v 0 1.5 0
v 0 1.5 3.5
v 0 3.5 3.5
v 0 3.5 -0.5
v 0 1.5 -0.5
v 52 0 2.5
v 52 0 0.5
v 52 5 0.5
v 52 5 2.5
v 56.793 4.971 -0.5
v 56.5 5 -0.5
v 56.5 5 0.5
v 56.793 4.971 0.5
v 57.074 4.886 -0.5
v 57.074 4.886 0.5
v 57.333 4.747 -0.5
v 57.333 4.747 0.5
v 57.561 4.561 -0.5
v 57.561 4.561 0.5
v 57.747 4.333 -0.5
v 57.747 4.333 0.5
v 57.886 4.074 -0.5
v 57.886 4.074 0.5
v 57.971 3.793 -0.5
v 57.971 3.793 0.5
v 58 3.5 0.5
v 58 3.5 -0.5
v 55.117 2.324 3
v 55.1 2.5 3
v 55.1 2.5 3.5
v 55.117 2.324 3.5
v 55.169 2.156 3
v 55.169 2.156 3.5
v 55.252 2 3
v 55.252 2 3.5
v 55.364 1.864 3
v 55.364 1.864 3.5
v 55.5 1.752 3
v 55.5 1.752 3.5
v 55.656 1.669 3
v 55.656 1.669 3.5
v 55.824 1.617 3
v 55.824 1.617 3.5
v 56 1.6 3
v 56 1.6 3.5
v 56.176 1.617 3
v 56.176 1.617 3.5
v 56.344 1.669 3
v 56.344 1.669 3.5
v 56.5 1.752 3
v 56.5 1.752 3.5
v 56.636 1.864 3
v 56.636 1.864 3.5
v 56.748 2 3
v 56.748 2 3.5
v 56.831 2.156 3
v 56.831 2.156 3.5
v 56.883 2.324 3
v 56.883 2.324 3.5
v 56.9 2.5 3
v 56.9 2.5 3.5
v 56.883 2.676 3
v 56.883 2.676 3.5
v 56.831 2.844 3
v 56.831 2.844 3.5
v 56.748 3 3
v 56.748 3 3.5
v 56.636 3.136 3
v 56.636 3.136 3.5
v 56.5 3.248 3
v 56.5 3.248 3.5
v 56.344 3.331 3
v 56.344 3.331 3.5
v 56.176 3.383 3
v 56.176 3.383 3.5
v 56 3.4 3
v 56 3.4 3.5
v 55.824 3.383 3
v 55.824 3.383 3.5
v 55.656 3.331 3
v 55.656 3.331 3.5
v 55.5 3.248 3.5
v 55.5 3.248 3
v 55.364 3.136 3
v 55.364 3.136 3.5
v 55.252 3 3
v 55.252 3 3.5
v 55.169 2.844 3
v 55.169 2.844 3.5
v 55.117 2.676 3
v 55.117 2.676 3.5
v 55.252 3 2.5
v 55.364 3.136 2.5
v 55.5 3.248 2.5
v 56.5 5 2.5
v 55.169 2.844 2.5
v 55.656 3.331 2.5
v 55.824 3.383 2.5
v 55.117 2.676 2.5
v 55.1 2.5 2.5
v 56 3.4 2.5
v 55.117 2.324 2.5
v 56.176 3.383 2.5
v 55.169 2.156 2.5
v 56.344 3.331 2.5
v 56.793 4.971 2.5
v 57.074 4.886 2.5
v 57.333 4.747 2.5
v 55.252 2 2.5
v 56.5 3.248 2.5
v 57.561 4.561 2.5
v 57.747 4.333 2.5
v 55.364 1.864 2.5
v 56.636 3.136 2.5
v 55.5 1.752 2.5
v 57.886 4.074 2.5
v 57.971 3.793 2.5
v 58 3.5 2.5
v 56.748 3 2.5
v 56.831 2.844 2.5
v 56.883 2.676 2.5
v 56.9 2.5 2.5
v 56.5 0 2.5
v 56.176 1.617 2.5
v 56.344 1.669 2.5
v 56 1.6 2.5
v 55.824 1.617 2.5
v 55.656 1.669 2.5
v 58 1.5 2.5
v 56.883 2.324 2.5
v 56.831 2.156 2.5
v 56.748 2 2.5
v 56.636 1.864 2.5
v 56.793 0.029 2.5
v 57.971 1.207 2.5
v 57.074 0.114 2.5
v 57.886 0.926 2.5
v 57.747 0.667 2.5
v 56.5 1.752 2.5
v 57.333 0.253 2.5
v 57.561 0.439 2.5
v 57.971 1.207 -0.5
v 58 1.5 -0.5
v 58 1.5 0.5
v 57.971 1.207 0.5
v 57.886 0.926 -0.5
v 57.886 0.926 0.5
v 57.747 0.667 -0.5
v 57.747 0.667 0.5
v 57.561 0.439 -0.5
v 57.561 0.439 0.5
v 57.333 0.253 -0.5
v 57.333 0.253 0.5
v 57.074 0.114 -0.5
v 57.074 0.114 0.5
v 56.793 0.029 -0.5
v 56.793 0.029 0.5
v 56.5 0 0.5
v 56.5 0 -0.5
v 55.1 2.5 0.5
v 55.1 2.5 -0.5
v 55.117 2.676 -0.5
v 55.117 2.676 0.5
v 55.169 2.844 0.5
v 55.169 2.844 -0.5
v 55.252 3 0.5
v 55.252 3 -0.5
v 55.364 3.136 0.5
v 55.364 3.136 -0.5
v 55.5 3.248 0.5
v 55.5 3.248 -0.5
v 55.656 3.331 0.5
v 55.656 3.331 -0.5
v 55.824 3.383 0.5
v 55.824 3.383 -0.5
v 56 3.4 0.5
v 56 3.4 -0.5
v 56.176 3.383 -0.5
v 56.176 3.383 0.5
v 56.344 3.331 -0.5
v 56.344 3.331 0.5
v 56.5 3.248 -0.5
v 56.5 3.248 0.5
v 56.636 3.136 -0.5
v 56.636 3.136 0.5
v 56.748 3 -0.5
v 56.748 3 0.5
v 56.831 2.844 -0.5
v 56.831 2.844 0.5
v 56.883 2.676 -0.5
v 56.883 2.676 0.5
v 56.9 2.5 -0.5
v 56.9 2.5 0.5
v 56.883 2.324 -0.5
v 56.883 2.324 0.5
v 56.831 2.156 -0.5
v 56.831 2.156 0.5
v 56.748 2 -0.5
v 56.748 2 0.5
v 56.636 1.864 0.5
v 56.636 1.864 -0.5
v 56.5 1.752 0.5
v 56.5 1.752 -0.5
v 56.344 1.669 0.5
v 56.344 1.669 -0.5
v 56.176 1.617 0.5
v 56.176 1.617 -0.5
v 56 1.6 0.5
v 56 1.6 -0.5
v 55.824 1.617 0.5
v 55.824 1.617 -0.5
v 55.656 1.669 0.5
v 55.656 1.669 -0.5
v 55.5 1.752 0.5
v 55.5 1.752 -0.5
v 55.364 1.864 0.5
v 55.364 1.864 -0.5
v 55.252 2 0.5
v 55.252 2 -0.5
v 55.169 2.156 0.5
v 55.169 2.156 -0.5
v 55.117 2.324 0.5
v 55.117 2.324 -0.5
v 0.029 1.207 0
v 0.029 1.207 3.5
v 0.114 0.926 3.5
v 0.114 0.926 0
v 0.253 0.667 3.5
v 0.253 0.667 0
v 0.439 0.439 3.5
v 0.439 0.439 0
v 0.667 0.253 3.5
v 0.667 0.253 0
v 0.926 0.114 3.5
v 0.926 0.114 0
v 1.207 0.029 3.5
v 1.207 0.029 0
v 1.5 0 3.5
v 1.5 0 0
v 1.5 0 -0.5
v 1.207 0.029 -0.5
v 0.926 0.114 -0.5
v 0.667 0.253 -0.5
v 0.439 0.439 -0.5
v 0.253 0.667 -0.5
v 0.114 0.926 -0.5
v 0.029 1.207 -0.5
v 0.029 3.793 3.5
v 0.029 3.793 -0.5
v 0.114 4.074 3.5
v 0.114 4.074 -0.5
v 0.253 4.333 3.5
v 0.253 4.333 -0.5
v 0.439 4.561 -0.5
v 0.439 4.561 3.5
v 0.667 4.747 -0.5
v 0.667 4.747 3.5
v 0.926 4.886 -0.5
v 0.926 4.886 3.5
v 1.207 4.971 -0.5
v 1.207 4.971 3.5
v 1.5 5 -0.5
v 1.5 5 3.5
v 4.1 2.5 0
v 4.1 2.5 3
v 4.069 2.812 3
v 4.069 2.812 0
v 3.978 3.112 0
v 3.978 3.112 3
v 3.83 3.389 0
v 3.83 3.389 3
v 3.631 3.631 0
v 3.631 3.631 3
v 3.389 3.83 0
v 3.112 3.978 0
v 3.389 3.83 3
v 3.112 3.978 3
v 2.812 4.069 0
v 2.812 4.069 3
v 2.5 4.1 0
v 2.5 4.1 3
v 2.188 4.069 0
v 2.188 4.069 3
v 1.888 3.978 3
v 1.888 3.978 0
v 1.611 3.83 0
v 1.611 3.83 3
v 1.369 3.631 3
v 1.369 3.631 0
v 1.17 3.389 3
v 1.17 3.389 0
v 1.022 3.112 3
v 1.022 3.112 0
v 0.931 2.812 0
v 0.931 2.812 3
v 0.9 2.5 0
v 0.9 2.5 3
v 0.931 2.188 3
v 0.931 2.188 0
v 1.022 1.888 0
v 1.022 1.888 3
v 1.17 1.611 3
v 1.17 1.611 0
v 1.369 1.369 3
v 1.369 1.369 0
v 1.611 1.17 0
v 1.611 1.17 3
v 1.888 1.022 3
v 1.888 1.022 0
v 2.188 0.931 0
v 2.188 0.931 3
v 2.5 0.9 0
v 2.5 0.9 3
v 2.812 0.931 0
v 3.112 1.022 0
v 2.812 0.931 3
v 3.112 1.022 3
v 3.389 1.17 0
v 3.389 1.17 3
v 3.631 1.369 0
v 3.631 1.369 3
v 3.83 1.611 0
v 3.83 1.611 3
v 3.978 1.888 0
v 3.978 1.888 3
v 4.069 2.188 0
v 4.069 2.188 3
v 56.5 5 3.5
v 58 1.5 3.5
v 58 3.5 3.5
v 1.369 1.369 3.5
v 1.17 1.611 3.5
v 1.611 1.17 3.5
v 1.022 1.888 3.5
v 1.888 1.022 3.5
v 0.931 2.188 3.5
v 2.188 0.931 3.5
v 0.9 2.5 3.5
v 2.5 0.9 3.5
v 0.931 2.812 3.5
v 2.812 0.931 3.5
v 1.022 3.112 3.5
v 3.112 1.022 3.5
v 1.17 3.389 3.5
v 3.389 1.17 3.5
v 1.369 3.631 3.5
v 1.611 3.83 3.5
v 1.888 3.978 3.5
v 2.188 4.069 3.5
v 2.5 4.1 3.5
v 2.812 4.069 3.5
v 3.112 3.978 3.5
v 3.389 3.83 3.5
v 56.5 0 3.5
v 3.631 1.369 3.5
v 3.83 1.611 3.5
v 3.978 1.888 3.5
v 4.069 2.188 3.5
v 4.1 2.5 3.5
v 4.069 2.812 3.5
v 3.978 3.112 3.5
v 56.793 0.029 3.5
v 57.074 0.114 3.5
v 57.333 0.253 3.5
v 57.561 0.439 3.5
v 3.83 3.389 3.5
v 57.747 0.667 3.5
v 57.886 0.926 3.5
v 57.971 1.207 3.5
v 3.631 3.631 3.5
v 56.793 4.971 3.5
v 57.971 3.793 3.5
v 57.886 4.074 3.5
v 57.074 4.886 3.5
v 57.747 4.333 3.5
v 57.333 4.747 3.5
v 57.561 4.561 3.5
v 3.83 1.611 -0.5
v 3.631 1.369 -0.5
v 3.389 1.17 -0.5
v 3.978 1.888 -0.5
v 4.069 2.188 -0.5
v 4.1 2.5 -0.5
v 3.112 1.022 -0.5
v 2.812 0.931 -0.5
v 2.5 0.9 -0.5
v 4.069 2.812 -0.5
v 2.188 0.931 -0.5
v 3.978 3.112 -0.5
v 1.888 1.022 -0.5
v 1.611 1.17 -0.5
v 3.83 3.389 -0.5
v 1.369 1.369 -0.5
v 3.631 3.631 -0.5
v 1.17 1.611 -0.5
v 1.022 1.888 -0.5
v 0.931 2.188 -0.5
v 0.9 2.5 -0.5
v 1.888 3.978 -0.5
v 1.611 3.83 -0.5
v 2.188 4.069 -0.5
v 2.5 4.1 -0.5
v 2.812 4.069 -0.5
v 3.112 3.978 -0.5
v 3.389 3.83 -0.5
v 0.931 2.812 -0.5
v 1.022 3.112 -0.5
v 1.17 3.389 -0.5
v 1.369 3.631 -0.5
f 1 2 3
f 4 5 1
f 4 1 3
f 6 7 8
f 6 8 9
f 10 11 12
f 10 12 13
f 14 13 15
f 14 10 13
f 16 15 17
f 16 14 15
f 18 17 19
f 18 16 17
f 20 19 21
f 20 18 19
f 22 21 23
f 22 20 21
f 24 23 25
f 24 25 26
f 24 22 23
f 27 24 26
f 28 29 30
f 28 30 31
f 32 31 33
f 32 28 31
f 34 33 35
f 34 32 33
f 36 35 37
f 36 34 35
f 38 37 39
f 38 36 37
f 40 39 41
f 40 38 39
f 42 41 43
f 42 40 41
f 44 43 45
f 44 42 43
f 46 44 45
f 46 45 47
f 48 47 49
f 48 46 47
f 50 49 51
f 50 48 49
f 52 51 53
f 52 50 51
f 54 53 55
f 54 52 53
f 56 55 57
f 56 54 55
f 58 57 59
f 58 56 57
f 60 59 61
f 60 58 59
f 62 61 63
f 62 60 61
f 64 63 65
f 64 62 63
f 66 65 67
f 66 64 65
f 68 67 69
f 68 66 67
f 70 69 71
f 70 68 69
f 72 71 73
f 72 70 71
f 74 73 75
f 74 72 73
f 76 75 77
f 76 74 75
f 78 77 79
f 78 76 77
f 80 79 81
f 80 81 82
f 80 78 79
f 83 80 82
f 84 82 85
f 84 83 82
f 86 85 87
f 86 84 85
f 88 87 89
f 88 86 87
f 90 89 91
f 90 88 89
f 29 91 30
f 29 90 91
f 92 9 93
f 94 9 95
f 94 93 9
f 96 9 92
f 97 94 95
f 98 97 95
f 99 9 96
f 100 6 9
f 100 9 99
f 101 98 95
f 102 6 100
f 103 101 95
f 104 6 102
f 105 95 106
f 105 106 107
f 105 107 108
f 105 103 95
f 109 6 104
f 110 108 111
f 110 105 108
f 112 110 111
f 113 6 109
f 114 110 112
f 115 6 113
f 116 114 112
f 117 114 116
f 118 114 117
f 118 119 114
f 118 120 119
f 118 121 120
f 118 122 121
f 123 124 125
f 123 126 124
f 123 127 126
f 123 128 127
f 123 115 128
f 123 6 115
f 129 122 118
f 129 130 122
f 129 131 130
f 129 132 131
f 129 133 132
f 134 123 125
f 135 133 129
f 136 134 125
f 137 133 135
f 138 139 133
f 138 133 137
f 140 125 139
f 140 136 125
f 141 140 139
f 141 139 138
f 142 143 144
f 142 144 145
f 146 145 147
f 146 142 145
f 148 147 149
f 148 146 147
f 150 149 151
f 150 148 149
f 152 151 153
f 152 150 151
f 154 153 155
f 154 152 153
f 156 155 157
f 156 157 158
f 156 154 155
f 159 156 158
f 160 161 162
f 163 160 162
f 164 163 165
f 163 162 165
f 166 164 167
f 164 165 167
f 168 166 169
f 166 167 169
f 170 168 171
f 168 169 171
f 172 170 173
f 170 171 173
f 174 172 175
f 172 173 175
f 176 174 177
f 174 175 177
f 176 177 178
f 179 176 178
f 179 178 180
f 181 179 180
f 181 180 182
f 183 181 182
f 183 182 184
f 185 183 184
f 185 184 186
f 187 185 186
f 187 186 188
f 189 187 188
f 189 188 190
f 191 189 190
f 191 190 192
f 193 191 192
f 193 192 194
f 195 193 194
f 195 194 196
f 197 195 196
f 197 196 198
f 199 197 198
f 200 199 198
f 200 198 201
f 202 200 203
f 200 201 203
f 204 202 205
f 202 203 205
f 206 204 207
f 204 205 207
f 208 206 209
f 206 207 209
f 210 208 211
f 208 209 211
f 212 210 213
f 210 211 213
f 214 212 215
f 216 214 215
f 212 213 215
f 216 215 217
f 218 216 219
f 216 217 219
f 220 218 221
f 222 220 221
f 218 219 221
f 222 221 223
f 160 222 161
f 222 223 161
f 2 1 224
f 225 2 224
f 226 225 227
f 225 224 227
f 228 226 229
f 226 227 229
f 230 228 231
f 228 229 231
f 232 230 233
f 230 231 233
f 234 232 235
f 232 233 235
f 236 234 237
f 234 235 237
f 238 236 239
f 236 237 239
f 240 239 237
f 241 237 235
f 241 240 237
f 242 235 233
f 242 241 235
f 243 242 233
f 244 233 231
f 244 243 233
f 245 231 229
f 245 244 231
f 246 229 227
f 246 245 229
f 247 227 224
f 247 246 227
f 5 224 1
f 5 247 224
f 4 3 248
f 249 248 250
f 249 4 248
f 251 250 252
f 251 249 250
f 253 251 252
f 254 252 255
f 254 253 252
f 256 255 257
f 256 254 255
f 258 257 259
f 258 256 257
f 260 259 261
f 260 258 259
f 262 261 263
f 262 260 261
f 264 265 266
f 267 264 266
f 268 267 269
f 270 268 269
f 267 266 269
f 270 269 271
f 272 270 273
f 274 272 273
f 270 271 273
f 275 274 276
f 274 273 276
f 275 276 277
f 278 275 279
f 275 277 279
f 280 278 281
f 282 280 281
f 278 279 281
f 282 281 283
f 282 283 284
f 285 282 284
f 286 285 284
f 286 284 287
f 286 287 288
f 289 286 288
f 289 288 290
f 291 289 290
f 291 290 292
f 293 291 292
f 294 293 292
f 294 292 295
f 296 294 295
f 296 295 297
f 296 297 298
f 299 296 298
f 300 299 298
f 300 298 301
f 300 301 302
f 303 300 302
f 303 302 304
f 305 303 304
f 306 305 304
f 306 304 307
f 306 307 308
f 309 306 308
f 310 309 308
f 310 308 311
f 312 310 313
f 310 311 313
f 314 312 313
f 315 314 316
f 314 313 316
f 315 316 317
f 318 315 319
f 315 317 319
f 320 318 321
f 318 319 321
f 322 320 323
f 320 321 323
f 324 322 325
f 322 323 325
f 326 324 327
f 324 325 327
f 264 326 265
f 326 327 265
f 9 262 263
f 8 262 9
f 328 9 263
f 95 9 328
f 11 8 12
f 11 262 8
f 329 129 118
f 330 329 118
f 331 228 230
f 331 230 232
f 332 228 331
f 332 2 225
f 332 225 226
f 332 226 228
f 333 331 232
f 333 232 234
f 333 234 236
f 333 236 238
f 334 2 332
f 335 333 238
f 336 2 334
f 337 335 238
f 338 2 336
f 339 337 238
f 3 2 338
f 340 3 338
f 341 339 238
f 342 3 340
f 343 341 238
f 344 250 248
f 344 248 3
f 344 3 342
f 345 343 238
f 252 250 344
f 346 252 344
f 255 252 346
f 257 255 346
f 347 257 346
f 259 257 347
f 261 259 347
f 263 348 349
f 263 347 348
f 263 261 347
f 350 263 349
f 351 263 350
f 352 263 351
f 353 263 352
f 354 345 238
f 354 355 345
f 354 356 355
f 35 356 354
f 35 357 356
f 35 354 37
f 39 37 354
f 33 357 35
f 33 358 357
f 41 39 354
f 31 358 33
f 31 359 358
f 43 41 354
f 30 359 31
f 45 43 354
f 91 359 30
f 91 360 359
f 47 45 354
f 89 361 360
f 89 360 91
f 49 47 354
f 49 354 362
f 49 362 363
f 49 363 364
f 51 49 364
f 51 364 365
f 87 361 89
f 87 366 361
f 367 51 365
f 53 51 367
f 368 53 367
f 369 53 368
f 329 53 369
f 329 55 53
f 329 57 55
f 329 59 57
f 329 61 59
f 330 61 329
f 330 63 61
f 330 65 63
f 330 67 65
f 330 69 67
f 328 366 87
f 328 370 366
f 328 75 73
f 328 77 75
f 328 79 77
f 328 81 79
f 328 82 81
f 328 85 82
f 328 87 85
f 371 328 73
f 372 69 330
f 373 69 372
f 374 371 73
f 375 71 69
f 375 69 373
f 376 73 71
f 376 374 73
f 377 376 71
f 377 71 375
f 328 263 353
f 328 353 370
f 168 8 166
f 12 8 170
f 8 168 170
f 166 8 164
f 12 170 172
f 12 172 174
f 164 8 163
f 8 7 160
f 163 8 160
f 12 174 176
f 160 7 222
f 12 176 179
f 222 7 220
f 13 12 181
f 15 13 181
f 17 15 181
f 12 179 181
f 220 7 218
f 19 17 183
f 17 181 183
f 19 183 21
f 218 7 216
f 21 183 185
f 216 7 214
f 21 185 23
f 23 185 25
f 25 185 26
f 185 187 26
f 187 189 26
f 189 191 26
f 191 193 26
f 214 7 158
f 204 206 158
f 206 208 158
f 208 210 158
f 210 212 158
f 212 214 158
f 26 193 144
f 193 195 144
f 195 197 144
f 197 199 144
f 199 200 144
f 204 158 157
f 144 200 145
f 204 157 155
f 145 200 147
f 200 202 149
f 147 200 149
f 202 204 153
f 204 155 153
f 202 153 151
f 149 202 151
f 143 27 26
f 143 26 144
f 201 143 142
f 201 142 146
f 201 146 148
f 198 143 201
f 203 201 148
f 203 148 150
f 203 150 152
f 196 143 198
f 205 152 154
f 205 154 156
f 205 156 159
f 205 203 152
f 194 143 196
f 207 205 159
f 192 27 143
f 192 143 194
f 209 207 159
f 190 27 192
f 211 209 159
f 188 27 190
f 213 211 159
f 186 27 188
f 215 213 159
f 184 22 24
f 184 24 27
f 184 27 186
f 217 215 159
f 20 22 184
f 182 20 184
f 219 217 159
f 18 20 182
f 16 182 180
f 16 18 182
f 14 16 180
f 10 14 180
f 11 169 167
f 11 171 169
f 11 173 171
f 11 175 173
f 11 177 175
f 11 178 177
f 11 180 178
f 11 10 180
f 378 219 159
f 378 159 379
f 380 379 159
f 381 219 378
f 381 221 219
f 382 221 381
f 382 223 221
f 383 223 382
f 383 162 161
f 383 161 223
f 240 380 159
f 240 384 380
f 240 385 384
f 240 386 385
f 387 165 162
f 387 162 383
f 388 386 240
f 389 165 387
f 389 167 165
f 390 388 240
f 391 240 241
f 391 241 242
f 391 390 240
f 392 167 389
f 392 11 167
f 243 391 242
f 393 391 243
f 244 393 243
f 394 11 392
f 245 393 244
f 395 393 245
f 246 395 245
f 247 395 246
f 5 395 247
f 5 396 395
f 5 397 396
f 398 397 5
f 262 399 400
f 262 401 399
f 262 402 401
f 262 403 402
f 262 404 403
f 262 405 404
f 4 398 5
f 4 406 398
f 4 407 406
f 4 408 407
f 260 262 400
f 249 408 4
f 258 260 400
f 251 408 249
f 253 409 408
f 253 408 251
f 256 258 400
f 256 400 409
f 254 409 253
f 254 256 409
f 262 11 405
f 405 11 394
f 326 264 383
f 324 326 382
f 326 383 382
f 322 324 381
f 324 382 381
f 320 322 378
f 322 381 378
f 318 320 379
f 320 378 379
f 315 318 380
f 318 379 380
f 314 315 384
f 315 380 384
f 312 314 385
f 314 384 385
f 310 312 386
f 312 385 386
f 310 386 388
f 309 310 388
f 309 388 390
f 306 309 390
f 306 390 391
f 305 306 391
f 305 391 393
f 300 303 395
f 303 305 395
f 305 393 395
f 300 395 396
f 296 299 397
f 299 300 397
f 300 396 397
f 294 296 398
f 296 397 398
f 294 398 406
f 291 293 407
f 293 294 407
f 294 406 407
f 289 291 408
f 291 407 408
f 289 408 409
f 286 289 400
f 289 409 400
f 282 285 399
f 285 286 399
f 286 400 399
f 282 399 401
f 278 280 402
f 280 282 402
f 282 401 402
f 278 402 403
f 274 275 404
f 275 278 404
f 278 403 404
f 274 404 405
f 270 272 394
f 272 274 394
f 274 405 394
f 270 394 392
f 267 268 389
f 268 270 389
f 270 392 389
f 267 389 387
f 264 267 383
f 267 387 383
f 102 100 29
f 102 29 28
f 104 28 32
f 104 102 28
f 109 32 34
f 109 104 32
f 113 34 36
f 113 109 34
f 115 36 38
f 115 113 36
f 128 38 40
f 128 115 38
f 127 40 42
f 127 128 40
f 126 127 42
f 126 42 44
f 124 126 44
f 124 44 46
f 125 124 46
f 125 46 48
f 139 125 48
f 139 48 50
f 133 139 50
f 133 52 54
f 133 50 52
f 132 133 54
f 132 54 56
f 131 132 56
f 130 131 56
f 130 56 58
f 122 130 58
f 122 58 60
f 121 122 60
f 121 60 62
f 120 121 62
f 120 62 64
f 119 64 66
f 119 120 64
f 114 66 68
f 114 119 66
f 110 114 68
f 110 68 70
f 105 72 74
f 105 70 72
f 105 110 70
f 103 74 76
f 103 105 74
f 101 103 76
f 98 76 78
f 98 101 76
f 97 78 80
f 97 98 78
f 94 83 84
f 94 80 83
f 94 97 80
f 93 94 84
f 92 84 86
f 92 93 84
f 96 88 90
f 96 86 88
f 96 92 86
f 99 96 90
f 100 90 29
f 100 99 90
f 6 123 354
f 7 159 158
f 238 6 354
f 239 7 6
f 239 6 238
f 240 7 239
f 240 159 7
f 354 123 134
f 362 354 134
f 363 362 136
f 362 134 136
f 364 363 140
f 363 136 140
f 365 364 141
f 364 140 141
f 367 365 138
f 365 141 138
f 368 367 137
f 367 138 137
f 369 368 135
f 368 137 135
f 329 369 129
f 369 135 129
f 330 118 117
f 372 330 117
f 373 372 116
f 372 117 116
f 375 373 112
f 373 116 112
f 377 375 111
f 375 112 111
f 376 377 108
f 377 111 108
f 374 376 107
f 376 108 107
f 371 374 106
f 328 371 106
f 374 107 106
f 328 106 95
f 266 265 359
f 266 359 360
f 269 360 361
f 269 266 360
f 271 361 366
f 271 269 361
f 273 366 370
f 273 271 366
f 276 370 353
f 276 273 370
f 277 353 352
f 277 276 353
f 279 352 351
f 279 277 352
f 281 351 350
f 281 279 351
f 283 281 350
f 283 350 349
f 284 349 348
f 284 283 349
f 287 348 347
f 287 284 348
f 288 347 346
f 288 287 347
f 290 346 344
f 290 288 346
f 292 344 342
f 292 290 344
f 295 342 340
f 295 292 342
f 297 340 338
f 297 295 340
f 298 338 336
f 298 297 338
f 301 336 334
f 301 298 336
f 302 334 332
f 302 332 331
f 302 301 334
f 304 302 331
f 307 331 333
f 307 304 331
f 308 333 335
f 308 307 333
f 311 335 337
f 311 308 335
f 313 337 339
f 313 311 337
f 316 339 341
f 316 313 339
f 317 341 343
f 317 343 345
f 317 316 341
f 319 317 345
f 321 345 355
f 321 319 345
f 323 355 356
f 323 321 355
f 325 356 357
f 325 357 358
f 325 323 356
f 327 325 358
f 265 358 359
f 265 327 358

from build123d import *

# Parameters (mm, degrees)
SKETCH_5_W          = 58
SKETCH_5_H          = 3
EXTRUDE_1_DEPTH     = 5
CUT_EXTRUDE_1_REACH = 60.292
SKETCH_6_R          = 1.6
CUT_EXTRUDE_2_REACH = 60.292
SKETCH_7_R          = 0.9
FILLET_1_R          = 1.5
SKETCH_8_W          = 6
SKETCH_8_H          = 1.6
CUT_EXTRUDE_3_DEPTH = 10
SKETCH_10_R         = 1.6
SKETCH_10_R_2       = 0.9
EXTRUDE_2_DEPTH     = 0.5
EXTRUDE_START       = 0.5
SKETCH_11_R         = 0.9
SKETCH_11_R_2       = 1.6
EXTRUDE_3_DEPTH     = 0.5
SKETCH_12_W         = 6.44666191
SKETCH_12_H         = 2
CUT_EXTRUDE_4_DEPTH = 10


with BuildPart() as part:
    # 草图5 → 凸台-拉伸1 (new body)
    with BuildSketch(Plane(origin=(0, 0, 0), x_dir=(1, 0, 0), z_dir=(0, 1, 0))):
        with Locations((29, -1.5)):
            Rectangle(SKETCH_5_W, SKETCH_5_H)
    extrude(amount=EXTRUDE_1_DEPTH)

    # 草图6 → 切除-拉伸1 (cut, up to next)
    with BuildSketch(Plane.XY.offset(3), mode=Mode.PRIVATE) as cut_extrude_1_sk1:
        with Locations((2.5, 2.5)):
            Circle(SKETCH_6_R)
    cut_extrude_1_tool1 = extrude(cut_extrude_1_sk1.sketch, amount=-CUT_EXTRUDE_1_REACH, mode=Mode.PRIVATE) & part.part
    add(cut_extrude_1_tool1.solids().sort_by_distance((2.5, 2.5, 3))[0], mode=Mode.SUBTRACT)

    # 草图7 → 切除-拉伸2 (cut, up to next)
    with BuildSketch(Plane.XY, mode=Mode.PRIVATE) as cut_extrude_2_sk1:
        with Locations(Location((56, 2.5, 0), (0, 0, 180))):
            Circle(SKETCH_7_R)
    cut_extrude_2_tool1 = extrude(cut_extrude_2_sk1.sketch, amount=CUT_EXTRUDE_2_REACH, mode=Mode.PRIVATE) & part.part
    add(cut_extrude_2_tool1.solids().sort_by_distance((56, 2.5, 0))[0], mode=Mode.SUBTRACT)

    # 圆角1
    fillet_1_edges = [part.edges().sort_by_distance(p)[0] for p in [
        (58, 5, 1.5),
        (58, 0, 1.5),
        (0, 0, 1.5),
        (0, 5, 1.5),
    ]]
    fillet(fillet_1_edges, radius=FILLET_1_R)

    # 草图8 → 切除-拉伸3 (cut)
    with BuildSketch(Plane(origin=(0, 5, 0), x_dir=(1, 0, 0), z_dir=(0, 1, 0))):
        with Locations((55, -1.5)):
            Rectangle(SKETCH_8_W, SKETCH_8_H)
    extrude(amount=-CUT_EXTRUDE_3_DEPTH, mode=Mode.SUBTRACT)

    # 草图10 → 凸台-拉伸2 (add)
    with BuildSketch(Plane.XY.offset(3)):
        with BuildLine():
            Line((58, 1.5), (58, 3.5))
            ThreePointArc((58, 3.5), (57.560660172, 4.560660172), (56.5, 5))
            Line((56.5, 5), (1.5, 5))
            ThreePointArc((1.5, 5), (0.439339828, 4.560660172), (0, 3.5))
            Line((0, 3.5), (0, 1.5))
            ThreePointArc((0, 1.5), (0.439339828, 0.439339828), (1.5, 0))
            Line((1.5, 0), (56.5, 0))
            ThreePointArc((56.5, 0), (57.560660172, 0.439339828), (58, 1.5))
        make_face()
        with Locations((2.5, 2.5)):
            Circle(SKETCH_10_R, mode=Mode.SUBTRACT)
        with Locations(Location((56, 2.5, 0), (0, 0, 180))):
            Circle(SKETCH_10_R_2, mode=Mode.SUBTRACT)
    extrude(amount=EXTRUDE_2_DEPTH)

    # 草图11 → 凸台-拉伸3 (add)
    with BuildSketch(Plane(origin=(0, 0, 0), x_dir=(-1, 0, 0), z_dir=(0, 0, -1)).offset(EXTRUDE_START)):
        with BuildLine():
            Line((-1.5, 5), (-56.5, 5))
            ThreePointArc((-56.5, 5), (-57.560660172, 4.560660172), (-58, 3.5))
            Line((-58, 3.5), (-58, 1.5))
            ThreePointArc((-58, 1.5), (-57.560660172, 0.439339828), (-56.5, 0))
            Line((-56.5, 0), (-1.5, 0))
            ThreePointArc((-1.5, 0), (-0.439339828, 0.439339828), (0, 1.5))
            Line((0, 1.5), (0, 3.5))
            ThreePointArc((0, 3.5), (-0.439339828, 4.560660172), (-1.5, 5))
        make_face()
        with Locations((-56, 2.5)):
            Circle(SKETCH_11_R, mode=Mode.SUBTRACT)
        with Locations(Location((-2.5, 2.5, 0), (0, 0, 180))):
            Circle(SKETCH_11_R_2, mode=Mode.SUBTRACT)
    extrude(amount=-EXTRUDE_3_DEPTH)

    # 草图12 → 切除-拉伸4 (cut)
    with BuildSketch(Plane.XZ):
        with Locations((55.223330955, 1.5)):
            Rectangle(SKETCH_12_W, SKETCH_12_H)
    extrude(amount=-CUT_EXTRUDE_4_DEPTH, mode=Mode.SUBTRACT)


solid = part.part
